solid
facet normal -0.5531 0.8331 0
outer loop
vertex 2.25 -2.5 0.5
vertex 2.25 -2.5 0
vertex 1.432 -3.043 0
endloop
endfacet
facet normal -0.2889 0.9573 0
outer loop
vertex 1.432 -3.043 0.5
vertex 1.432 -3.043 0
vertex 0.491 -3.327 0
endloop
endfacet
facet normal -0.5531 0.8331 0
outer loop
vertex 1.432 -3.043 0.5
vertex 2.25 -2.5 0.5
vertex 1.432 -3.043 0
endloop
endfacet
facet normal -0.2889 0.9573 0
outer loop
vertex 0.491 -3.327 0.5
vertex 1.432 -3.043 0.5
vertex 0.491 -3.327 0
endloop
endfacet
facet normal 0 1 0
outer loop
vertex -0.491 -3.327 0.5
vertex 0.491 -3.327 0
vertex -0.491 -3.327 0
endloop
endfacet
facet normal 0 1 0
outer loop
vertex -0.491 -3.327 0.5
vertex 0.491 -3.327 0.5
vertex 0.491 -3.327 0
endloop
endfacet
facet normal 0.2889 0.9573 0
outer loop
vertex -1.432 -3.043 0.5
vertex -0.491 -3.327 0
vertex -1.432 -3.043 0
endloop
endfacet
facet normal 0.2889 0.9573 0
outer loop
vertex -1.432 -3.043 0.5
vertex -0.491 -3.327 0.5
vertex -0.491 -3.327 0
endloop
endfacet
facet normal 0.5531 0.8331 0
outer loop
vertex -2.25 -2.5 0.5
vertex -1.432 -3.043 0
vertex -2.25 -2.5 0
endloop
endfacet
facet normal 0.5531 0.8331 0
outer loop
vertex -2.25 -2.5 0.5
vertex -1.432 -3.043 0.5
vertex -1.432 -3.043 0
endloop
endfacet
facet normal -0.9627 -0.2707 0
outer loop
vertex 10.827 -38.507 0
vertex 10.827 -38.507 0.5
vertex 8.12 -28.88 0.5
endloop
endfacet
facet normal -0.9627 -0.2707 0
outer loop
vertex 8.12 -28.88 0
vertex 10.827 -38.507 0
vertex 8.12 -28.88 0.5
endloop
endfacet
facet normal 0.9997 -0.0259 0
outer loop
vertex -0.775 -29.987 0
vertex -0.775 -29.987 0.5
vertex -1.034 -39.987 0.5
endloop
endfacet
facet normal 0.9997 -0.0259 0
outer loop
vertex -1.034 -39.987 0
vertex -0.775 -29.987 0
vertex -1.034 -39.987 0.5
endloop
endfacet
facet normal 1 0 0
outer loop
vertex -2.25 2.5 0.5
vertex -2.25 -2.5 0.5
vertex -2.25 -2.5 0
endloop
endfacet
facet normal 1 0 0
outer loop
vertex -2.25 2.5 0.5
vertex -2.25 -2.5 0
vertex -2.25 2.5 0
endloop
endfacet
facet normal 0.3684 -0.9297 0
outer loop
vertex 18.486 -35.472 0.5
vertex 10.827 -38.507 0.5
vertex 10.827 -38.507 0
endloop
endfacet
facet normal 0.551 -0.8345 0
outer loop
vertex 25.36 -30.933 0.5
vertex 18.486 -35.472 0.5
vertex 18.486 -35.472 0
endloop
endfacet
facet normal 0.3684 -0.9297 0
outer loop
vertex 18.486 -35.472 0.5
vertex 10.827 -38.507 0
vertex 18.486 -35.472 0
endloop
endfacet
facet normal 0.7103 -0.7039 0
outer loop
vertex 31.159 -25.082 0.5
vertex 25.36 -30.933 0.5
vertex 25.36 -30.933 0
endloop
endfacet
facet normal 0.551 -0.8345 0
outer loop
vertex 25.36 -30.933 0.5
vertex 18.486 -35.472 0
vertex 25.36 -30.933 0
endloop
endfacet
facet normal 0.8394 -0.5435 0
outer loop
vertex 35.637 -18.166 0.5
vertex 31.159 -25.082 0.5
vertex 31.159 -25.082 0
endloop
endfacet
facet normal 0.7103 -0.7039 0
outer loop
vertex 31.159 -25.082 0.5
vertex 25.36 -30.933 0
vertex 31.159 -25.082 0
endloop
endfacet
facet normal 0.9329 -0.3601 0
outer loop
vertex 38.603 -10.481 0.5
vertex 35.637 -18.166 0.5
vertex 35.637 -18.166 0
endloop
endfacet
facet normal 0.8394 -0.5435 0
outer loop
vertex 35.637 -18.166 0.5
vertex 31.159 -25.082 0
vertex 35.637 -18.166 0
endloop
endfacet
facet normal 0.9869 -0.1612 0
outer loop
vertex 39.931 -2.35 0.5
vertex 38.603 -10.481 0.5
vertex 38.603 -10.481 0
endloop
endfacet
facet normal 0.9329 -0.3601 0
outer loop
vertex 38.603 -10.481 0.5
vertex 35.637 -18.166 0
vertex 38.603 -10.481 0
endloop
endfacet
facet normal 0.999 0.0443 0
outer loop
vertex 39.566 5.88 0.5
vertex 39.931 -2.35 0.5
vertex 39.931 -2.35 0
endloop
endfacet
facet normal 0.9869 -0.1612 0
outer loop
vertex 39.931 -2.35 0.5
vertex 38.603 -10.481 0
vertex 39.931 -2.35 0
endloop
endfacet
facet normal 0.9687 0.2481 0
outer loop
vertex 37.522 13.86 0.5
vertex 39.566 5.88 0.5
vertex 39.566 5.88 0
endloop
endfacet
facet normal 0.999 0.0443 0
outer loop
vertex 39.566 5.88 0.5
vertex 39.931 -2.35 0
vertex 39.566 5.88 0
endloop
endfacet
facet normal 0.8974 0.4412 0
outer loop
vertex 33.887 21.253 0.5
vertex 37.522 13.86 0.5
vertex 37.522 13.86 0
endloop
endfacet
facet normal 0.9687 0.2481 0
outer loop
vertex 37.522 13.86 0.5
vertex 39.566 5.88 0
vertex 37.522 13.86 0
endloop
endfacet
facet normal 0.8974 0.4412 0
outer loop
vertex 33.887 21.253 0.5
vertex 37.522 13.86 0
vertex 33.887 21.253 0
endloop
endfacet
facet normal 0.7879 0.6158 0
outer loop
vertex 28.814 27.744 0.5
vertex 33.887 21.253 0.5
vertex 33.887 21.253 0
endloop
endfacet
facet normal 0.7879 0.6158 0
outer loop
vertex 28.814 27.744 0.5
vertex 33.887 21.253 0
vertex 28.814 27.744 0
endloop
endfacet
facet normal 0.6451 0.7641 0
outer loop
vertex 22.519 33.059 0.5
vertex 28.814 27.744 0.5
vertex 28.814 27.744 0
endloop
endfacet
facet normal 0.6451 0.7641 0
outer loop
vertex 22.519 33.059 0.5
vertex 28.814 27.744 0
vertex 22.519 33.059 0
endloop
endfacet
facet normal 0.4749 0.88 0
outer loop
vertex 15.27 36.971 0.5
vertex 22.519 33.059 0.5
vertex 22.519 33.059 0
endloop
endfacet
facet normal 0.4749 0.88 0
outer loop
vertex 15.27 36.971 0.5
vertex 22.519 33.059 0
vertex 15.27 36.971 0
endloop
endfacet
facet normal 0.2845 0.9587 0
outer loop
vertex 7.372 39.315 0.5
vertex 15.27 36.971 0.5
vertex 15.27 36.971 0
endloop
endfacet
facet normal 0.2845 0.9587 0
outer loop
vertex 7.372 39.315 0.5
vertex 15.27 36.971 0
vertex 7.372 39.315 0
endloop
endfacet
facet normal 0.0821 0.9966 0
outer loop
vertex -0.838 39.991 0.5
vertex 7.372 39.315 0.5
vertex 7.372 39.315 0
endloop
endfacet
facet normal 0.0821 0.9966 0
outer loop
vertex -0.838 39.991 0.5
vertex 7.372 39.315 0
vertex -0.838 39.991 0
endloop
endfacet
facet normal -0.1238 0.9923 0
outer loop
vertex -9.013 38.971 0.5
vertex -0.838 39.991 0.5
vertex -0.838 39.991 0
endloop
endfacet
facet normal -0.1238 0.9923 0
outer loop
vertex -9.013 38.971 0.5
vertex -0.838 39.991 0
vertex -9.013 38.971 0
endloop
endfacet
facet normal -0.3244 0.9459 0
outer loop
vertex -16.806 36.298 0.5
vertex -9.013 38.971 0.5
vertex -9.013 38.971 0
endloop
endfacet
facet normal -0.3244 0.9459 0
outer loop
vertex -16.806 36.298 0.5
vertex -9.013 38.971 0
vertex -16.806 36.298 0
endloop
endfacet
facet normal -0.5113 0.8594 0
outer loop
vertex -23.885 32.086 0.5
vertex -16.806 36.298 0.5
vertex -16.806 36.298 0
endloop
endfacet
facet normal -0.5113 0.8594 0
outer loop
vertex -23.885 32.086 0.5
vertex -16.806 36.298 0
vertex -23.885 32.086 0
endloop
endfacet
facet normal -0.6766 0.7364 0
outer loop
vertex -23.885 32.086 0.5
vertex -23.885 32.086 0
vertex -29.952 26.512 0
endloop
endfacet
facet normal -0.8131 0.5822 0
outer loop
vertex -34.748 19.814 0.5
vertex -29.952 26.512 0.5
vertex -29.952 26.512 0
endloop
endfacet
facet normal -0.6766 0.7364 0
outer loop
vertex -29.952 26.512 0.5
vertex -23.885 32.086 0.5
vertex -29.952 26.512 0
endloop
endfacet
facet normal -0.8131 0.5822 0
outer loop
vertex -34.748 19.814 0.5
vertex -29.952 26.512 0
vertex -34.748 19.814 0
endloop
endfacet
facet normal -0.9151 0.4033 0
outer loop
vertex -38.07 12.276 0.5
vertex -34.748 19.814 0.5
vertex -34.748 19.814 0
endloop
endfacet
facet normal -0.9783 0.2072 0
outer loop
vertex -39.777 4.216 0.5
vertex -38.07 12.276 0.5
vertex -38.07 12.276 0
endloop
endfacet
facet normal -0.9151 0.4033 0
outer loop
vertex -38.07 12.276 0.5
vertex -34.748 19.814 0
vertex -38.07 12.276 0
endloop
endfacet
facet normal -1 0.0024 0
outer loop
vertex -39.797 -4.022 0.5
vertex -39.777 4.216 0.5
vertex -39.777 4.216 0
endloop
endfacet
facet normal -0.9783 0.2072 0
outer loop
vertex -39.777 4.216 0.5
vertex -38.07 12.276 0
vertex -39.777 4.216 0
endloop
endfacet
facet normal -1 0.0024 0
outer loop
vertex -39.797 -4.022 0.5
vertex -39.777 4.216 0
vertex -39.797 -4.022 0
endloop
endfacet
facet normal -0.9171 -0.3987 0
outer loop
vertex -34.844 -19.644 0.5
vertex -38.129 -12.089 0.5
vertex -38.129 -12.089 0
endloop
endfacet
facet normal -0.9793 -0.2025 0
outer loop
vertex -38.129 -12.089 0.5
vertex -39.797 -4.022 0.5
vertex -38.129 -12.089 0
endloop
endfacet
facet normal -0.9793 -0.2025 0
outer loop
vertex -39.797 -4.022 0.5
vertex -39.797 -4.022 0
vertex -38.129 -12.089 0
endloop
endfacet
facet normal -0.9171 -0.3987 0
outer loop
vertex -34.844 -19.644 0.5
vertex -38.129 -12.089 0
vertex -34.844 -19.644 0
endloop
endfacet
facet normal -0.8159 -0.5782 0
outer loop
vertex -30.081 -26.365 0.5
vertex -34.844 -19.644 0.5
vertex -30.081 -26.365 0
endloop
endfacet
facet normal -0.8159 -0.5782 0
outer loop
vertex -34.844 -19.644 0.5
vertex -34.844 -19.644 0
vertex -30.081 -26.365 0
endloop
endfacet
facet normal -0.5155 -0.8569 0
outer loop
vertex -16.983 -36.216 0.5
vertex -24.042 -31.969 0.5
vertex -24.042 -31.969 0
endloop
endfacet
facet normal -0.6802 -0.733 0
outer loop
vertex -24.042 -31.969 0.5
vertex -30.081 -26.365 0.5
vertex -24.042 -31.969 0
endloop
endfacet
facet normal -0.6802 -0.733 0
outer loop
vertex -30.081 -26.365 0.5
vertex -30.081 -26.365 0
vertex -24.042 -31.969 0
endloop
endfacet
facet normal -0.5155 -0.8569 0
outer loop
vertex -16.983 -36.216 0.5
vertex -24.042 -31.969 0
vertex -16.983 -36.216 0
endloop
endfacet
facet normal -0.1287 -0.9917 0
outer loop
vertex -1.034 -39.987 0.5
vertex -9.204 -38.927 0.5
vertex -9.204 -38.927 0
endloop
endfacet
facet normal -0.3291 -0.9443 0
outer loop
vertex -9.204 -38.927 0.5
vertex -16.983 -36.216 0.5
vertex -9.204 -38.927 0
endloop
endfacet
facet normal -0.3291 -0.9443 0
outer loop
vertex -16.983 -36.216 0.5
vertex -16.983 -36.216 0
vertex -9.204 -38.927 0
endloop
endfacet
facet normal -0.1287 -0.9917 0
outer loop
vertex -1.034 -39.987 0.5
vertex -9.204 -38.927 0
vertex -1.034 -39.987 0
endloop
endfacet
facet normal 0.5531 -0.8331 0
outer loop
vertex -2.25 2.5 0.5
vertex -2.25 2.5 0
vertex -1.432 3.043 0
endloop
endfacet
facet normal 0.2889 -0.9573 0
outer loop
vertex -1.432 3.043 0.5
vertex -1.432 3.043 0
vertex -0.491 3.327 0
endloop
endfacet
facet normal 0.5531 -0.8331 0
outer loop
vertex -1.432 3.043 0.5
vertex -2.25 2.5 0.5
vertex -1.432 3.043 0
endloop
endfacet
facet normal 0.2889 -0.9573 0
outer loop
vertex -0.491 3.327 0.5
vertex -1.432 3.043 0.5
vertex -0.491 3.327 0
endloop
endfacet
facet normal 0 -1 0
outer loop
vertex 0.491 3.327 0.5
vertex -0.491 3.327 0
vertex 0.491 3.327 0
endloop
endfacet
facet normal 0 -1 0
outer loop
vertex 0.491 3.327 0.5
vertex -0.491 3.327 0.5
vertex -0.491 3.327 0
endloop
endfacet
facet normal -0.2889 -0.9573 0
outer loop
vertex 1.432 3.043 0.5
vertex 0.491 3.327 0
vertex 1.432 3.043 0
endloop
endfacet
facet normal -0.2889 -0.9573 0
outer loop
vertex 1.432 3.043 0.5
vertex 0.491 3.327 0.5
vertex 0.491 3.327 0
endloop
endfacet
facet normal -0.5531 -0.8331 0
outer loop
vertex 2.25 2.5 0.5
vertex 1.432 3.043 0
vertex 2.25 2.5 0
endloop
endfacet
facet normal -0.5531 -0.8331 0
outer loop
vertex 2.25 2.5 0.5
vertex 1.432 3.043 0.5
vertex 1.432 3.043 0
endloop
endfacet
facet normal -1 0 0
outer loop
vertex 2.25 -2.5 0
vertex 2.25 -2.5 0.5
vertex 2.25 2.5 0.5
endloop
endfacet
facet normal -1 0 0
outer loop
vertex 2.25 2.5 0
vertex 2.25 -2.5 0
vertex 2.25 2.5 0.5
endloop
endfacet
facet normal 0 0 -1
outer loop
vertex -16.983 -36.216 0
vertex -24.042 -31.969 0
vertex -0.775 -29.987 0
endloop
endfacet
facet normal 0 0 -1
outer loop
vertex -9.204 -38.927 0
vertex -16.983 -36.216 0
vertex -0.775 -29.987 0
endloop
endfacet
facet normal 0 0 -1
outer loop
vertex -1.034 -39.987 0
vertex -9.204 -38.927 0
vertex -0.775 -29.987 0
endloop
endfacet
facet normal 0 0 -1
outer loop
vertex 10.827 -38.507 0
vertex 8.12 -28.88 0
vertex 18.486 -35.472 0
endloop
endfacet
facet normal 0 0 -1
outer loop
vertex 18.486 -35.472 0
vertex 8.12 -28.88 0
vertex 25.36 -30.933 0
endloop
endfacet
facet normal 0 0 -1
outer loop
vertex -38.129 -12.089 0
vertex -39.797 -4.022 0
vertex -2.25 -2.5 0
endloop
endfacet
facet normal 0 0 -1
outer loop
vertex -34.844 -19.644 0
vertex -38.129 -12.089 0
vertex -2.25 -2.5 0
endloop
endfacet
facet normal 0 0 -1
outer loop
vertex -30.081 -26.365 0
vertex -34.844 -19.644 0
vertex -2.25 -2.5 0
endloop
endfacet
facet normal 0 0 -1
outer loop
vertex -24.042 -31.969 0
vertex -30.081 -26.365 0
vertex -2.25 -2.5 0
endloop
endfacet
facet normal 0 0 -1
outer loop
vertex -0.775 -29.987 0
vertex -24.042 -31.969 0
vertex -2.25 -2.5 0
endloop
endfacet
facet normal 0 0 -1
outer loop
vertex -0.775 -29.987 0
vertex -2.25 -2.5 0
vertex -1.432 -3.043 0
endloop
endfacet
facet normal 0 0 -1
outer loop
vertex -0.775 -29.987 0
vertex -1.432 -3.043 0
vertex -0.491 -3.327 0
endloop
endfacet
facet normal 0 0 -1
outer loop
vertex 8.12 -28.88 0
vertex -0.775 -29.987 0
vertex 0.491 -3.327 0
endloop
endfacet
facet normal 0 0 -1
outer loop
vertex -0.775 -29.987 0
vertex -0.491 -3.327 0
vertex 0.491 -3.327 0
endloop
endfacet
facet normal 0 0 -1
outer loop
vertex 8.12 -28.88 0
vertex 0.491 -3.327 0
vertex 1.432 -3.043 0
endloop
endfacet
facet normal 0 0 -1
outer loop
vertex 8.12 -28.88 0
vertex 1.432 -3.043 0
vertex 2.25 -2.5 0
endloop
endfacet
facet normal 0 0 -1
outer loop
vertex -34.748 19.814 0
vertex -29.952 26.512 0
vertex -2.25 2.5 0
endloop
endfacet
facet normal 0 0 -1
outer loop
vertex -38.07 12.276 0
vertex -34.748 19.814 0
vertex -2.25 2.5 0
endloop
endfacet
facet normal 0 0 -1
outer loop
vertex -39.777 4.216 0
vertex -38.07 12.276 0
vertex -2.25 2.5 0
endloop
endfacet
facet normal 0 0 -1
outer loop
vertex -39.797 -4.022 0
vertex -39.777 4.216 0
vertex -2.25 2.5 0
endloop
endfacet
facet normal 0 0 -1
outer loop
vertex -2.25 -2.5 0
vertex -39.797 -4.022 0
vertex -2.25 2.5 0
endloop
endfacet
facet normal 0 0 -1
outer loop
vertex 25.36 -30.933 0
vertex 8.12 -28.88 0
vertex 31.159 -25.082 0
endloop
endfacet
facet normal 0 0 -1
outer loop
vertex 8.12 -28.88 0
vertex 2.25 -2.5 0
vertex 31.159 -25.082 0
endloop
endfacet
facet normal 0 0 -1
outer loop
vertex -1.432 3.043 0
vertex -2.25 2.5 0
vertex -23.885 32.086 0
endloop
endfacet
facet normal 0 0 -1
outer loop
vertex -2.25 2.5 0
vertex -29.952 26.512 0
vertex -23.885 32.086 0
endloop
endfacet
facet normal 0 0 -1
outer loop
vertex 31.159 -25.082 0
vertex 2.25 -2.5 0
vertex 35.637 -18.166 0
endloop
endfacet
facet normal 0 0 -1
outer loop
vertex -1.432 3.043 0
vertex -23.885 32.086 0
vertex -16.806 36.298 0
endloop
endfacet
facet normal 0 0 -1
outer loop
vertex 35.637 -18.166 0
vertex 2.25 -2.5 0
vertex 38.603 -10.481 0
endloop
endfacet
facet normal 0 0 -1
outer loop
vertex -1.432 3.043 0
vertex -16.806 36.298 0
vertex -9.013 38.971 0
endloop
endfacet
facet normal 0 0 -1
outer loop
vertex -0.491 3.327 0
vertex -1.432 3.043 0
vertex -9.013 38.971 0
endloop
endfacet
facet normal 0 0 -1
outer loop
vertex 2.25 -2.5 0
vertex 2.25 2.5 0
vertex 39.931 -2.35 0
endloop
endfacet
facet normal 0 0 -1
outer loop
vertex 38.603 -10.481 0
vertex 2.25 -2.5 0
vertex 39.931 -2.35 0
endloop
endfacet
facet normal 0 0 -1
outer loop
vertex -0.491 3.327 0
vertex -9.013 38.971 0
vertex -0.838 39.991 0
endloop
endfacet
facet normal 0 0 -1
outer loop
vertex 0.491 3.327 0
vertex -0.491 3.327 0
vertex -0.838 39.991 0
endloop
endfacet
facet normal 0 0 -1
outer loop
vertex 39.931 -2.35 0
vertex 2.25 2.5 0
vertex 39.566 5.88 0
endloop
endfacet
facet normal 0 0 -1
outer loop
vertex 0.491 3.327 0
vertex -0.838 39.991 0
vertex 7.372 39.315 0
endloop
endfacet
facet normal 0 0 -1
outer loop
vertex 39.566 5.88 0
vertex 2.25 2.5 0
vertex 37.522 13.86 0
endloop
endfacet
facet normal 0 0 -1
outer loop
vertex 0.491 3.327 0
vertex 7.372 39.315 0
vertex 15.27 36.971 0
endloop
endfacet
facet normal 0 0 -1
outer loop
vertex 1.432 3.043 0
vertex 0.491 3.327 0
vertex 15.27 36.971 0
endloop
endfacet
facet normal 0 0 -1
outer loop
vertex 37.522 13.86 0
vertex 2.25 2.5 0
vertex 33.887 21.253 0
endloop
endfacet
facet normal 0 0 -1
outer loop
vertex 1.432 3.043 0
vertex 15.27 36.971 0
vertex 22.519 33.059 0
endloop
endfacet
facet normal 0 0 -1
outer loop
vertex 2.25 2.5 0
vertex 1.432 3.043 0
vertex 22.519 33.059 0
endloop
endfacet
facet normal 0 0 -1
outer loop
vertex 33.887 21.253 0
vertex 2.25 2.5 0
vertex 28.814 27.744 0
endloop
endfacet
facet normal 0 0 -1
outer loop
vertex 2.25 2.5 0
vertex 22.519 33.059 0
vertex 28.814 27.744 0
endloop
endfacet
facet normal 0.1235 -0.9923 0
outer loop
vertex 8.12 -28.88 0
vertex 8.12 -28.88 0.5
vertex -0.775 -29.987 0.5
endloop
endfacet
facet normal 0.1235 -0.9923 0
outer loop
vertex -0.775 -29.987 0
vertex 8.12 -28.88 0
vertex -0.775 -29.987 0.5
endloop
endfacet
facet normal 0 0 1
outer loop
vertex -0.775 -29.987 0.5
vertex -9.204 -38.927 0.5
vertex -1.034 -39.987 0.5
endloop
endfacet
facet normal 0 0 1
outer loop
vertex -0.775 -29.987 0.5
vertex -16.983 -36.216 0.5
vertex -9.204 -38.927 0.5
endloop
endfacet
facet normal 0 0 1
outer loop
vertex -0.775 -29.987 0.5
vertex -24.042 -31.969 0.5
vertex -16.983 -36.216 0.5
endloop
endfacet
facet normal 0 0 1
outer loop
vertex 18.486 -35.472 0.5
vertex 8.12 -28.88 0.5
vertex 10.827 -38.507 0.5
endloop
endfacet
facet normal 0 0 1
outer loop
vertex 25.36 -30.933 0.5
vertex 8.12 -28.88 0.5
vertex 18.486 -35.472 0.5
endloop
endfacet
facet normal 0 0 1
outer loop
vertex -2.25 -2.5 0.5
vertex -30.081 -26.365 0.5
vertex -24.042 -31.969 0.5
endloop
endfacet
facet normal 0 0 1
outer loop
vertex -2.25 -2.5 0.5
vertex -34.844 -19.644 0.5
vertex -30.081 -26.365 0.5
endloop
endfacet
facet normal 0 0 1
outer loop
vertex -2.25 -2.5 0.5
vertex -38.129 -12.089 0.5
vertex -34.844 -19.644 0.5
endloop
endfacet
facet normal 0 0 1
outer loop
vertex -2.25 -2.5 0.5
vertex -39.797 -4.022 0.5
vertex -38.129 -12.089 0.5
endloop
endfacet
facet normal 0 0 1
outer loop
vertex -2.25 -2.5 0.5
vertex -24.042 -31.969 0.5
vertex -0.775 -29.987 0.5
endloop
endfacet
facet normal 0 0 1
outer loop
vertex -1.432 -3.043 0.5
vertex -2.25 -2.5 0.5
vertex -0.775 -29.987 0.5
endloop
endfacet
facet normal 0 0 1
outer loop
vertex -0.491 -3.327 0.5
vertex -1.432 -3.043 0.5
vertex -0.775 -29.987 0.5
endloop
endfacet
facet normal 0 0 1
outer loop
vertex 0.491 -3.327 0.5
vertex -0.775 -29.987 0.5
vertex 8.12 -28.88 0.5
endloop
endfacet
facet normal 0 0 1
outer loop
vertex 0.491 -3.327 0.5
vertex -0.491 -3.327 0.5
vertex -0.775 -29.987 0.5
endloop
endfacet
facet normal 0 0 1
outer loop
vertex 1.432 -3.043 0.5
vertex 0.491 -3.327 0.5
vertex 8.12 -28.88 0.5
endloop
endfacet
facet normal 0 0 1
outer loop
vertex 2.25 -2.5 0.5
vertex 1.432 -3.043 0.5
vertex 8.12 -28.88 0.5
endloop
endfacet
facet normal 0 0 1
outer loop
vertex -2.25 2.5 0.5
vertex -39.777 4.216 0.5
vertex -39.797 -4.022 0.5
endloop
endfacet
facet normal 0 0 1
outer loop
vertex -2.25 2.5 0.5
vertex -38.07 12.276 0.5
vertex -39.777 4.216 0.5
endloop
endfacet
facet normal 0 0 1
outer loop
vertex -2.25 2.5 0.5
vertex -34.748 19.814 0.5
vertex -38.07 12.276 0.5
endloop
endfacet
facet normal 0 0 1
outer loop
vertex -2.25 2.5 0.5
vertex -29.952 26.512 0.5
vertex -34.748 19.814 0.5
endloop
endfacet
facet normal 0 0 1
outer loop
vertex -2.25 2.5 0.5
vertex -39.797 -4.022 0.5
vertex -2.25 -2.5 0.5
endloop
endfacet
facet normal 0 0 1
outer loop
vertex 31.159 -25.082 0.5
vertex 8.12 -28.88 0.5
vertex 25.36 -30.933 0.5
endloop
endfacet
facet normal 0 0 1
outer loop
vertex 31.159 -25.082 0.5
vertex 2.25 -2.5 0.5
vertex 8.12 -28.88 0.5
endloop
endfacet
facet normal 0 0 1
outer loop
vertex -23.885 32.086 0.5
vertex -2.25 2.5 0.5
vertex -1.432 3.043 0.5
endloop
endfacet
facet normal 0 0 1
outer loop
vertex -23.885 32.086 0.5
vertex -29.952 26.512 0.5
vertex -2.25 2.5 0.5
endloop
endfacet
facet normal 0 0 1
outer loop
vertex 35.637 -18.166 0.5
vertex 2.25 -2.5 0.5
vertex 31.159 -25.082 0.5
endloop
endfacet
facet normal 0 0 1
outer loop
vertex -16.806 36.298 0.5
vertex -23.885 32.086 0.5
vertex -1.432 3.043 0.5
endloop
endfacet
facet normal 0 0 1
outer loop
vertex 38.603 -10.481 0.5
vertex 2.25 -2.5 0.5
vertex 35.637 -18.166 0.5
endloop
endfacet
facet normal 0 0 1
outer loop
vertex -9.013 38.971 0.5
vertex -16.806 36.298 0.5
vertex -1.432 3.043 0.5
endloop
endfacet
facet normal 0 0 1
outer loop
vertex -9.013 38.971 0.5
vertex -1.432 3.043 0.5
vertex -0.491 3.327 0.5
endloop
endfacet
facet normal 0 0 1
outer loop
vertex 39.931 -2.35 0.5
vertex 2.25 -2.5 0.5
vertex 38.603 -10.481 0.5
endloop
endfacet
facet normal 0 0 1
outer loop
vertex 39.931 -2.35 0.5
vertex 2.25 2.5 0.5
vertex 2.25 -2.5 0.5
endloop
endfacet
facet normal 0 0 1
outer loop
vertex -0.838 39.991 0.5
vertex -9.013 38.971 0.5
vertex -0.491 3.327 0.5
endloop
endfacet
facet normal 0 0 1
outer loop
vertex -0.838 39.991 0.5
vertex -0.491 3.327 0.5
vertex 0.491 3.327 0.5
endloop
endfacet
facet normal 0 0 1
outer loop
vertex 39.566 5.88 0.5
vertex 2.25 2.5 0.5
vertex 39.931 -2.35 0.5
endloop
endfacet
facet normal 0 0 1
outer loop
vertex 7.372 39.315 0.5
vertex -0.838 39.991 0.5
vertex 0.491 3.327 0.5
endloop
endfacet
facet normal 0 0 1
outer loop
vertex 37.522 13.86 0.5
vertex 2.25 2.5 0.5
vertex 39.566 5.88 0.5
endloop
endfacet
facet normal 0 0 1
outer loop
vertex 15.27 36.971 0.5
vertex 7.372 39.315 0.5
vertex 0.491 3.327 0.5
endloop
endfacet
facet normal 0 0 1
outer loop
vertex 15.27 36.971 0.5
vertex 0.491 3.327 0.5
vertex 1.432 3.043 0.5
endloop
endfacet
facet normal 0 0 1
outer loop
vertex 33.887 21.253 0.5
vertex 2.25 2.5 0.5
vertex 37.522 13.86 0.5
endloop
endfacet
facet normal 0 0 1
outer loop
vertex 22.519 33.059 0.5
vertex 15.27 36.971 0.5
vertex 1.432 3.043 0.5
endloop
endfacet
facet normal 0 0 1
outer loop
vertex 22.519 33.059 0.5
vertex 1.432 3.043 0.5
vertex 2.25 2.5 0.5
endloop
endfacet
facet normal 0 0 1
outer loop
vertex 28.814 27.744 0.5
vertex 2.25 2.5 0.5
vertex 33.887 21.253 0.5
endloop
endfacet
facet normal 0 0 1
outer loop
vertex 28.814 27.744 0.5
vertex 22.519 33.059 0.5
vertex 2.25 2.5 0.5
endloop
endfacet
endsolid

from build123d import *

# Parameters (mm, degrees)
ESQUISSE1_R             = 40
BOSS_EXTRU_1_DEPTH      = 0.5
ENL_V_MAT_EXTRU_1_DEPTH = 57.57075216
ENL_V_MAT_EXTRU_2_DEPTH = 57.57075216


with BuildPart() as part:
    # Esquisse1 → Boss.-Extru.1 (new body)
    with BuildSketch(Plane.XY):
        Circle(ESQUISSE1_R)
    extrude(amount=BOSS_EXTRU_1_DEPTH)

    # Esquisse3 → Enlèv. mat.-Extru.1 (cut, through all)
    with BuildSketch(Plane.XY.offset(0.5)):
        with BuildLine():
            Line((2.25, -2.5), (2.25, 2.5))
            ThreePointArc((2.25, 2.5), (0, 3.363406012), (-2.25, 2.5))
            Line((-2.25, 2.5), (-2.25, -2.5))
            ThreePointArc((-2.25, -2.5), (0, -3.363406012), (2.25, -2.5))
        make_face()
    extrude(amount=-ENL_V_MAT_EXTRU_1_DEPTH, mode=Mode.SUBTRACT)

    # Esquisse8 → Enlèv. mat.-Extru.2 (cut, through all)
    with BuildSketch(Plane.XY.offset(0.5)):
        with BuildLine():
            Line((8.120202921, -28.880136851), (-0.775413277, -29.986633327))
            Line((-0.775413277, -29.986633327), (-1.033999584, -39.986633327))
            ThreePointArc((-1.033999584, -39.986633327), (4.952054851, -39.69228077), (10.826937228, -38.506849134))
            Line((10.826937228, -38.506849134), (8.120202921, -28.880136851))
        make_face()
    extrude(amount=-ENL_V_MAT_EXTRU_2_DEPTH, mode=Mode.SUBTRACT)


solid = part.part
